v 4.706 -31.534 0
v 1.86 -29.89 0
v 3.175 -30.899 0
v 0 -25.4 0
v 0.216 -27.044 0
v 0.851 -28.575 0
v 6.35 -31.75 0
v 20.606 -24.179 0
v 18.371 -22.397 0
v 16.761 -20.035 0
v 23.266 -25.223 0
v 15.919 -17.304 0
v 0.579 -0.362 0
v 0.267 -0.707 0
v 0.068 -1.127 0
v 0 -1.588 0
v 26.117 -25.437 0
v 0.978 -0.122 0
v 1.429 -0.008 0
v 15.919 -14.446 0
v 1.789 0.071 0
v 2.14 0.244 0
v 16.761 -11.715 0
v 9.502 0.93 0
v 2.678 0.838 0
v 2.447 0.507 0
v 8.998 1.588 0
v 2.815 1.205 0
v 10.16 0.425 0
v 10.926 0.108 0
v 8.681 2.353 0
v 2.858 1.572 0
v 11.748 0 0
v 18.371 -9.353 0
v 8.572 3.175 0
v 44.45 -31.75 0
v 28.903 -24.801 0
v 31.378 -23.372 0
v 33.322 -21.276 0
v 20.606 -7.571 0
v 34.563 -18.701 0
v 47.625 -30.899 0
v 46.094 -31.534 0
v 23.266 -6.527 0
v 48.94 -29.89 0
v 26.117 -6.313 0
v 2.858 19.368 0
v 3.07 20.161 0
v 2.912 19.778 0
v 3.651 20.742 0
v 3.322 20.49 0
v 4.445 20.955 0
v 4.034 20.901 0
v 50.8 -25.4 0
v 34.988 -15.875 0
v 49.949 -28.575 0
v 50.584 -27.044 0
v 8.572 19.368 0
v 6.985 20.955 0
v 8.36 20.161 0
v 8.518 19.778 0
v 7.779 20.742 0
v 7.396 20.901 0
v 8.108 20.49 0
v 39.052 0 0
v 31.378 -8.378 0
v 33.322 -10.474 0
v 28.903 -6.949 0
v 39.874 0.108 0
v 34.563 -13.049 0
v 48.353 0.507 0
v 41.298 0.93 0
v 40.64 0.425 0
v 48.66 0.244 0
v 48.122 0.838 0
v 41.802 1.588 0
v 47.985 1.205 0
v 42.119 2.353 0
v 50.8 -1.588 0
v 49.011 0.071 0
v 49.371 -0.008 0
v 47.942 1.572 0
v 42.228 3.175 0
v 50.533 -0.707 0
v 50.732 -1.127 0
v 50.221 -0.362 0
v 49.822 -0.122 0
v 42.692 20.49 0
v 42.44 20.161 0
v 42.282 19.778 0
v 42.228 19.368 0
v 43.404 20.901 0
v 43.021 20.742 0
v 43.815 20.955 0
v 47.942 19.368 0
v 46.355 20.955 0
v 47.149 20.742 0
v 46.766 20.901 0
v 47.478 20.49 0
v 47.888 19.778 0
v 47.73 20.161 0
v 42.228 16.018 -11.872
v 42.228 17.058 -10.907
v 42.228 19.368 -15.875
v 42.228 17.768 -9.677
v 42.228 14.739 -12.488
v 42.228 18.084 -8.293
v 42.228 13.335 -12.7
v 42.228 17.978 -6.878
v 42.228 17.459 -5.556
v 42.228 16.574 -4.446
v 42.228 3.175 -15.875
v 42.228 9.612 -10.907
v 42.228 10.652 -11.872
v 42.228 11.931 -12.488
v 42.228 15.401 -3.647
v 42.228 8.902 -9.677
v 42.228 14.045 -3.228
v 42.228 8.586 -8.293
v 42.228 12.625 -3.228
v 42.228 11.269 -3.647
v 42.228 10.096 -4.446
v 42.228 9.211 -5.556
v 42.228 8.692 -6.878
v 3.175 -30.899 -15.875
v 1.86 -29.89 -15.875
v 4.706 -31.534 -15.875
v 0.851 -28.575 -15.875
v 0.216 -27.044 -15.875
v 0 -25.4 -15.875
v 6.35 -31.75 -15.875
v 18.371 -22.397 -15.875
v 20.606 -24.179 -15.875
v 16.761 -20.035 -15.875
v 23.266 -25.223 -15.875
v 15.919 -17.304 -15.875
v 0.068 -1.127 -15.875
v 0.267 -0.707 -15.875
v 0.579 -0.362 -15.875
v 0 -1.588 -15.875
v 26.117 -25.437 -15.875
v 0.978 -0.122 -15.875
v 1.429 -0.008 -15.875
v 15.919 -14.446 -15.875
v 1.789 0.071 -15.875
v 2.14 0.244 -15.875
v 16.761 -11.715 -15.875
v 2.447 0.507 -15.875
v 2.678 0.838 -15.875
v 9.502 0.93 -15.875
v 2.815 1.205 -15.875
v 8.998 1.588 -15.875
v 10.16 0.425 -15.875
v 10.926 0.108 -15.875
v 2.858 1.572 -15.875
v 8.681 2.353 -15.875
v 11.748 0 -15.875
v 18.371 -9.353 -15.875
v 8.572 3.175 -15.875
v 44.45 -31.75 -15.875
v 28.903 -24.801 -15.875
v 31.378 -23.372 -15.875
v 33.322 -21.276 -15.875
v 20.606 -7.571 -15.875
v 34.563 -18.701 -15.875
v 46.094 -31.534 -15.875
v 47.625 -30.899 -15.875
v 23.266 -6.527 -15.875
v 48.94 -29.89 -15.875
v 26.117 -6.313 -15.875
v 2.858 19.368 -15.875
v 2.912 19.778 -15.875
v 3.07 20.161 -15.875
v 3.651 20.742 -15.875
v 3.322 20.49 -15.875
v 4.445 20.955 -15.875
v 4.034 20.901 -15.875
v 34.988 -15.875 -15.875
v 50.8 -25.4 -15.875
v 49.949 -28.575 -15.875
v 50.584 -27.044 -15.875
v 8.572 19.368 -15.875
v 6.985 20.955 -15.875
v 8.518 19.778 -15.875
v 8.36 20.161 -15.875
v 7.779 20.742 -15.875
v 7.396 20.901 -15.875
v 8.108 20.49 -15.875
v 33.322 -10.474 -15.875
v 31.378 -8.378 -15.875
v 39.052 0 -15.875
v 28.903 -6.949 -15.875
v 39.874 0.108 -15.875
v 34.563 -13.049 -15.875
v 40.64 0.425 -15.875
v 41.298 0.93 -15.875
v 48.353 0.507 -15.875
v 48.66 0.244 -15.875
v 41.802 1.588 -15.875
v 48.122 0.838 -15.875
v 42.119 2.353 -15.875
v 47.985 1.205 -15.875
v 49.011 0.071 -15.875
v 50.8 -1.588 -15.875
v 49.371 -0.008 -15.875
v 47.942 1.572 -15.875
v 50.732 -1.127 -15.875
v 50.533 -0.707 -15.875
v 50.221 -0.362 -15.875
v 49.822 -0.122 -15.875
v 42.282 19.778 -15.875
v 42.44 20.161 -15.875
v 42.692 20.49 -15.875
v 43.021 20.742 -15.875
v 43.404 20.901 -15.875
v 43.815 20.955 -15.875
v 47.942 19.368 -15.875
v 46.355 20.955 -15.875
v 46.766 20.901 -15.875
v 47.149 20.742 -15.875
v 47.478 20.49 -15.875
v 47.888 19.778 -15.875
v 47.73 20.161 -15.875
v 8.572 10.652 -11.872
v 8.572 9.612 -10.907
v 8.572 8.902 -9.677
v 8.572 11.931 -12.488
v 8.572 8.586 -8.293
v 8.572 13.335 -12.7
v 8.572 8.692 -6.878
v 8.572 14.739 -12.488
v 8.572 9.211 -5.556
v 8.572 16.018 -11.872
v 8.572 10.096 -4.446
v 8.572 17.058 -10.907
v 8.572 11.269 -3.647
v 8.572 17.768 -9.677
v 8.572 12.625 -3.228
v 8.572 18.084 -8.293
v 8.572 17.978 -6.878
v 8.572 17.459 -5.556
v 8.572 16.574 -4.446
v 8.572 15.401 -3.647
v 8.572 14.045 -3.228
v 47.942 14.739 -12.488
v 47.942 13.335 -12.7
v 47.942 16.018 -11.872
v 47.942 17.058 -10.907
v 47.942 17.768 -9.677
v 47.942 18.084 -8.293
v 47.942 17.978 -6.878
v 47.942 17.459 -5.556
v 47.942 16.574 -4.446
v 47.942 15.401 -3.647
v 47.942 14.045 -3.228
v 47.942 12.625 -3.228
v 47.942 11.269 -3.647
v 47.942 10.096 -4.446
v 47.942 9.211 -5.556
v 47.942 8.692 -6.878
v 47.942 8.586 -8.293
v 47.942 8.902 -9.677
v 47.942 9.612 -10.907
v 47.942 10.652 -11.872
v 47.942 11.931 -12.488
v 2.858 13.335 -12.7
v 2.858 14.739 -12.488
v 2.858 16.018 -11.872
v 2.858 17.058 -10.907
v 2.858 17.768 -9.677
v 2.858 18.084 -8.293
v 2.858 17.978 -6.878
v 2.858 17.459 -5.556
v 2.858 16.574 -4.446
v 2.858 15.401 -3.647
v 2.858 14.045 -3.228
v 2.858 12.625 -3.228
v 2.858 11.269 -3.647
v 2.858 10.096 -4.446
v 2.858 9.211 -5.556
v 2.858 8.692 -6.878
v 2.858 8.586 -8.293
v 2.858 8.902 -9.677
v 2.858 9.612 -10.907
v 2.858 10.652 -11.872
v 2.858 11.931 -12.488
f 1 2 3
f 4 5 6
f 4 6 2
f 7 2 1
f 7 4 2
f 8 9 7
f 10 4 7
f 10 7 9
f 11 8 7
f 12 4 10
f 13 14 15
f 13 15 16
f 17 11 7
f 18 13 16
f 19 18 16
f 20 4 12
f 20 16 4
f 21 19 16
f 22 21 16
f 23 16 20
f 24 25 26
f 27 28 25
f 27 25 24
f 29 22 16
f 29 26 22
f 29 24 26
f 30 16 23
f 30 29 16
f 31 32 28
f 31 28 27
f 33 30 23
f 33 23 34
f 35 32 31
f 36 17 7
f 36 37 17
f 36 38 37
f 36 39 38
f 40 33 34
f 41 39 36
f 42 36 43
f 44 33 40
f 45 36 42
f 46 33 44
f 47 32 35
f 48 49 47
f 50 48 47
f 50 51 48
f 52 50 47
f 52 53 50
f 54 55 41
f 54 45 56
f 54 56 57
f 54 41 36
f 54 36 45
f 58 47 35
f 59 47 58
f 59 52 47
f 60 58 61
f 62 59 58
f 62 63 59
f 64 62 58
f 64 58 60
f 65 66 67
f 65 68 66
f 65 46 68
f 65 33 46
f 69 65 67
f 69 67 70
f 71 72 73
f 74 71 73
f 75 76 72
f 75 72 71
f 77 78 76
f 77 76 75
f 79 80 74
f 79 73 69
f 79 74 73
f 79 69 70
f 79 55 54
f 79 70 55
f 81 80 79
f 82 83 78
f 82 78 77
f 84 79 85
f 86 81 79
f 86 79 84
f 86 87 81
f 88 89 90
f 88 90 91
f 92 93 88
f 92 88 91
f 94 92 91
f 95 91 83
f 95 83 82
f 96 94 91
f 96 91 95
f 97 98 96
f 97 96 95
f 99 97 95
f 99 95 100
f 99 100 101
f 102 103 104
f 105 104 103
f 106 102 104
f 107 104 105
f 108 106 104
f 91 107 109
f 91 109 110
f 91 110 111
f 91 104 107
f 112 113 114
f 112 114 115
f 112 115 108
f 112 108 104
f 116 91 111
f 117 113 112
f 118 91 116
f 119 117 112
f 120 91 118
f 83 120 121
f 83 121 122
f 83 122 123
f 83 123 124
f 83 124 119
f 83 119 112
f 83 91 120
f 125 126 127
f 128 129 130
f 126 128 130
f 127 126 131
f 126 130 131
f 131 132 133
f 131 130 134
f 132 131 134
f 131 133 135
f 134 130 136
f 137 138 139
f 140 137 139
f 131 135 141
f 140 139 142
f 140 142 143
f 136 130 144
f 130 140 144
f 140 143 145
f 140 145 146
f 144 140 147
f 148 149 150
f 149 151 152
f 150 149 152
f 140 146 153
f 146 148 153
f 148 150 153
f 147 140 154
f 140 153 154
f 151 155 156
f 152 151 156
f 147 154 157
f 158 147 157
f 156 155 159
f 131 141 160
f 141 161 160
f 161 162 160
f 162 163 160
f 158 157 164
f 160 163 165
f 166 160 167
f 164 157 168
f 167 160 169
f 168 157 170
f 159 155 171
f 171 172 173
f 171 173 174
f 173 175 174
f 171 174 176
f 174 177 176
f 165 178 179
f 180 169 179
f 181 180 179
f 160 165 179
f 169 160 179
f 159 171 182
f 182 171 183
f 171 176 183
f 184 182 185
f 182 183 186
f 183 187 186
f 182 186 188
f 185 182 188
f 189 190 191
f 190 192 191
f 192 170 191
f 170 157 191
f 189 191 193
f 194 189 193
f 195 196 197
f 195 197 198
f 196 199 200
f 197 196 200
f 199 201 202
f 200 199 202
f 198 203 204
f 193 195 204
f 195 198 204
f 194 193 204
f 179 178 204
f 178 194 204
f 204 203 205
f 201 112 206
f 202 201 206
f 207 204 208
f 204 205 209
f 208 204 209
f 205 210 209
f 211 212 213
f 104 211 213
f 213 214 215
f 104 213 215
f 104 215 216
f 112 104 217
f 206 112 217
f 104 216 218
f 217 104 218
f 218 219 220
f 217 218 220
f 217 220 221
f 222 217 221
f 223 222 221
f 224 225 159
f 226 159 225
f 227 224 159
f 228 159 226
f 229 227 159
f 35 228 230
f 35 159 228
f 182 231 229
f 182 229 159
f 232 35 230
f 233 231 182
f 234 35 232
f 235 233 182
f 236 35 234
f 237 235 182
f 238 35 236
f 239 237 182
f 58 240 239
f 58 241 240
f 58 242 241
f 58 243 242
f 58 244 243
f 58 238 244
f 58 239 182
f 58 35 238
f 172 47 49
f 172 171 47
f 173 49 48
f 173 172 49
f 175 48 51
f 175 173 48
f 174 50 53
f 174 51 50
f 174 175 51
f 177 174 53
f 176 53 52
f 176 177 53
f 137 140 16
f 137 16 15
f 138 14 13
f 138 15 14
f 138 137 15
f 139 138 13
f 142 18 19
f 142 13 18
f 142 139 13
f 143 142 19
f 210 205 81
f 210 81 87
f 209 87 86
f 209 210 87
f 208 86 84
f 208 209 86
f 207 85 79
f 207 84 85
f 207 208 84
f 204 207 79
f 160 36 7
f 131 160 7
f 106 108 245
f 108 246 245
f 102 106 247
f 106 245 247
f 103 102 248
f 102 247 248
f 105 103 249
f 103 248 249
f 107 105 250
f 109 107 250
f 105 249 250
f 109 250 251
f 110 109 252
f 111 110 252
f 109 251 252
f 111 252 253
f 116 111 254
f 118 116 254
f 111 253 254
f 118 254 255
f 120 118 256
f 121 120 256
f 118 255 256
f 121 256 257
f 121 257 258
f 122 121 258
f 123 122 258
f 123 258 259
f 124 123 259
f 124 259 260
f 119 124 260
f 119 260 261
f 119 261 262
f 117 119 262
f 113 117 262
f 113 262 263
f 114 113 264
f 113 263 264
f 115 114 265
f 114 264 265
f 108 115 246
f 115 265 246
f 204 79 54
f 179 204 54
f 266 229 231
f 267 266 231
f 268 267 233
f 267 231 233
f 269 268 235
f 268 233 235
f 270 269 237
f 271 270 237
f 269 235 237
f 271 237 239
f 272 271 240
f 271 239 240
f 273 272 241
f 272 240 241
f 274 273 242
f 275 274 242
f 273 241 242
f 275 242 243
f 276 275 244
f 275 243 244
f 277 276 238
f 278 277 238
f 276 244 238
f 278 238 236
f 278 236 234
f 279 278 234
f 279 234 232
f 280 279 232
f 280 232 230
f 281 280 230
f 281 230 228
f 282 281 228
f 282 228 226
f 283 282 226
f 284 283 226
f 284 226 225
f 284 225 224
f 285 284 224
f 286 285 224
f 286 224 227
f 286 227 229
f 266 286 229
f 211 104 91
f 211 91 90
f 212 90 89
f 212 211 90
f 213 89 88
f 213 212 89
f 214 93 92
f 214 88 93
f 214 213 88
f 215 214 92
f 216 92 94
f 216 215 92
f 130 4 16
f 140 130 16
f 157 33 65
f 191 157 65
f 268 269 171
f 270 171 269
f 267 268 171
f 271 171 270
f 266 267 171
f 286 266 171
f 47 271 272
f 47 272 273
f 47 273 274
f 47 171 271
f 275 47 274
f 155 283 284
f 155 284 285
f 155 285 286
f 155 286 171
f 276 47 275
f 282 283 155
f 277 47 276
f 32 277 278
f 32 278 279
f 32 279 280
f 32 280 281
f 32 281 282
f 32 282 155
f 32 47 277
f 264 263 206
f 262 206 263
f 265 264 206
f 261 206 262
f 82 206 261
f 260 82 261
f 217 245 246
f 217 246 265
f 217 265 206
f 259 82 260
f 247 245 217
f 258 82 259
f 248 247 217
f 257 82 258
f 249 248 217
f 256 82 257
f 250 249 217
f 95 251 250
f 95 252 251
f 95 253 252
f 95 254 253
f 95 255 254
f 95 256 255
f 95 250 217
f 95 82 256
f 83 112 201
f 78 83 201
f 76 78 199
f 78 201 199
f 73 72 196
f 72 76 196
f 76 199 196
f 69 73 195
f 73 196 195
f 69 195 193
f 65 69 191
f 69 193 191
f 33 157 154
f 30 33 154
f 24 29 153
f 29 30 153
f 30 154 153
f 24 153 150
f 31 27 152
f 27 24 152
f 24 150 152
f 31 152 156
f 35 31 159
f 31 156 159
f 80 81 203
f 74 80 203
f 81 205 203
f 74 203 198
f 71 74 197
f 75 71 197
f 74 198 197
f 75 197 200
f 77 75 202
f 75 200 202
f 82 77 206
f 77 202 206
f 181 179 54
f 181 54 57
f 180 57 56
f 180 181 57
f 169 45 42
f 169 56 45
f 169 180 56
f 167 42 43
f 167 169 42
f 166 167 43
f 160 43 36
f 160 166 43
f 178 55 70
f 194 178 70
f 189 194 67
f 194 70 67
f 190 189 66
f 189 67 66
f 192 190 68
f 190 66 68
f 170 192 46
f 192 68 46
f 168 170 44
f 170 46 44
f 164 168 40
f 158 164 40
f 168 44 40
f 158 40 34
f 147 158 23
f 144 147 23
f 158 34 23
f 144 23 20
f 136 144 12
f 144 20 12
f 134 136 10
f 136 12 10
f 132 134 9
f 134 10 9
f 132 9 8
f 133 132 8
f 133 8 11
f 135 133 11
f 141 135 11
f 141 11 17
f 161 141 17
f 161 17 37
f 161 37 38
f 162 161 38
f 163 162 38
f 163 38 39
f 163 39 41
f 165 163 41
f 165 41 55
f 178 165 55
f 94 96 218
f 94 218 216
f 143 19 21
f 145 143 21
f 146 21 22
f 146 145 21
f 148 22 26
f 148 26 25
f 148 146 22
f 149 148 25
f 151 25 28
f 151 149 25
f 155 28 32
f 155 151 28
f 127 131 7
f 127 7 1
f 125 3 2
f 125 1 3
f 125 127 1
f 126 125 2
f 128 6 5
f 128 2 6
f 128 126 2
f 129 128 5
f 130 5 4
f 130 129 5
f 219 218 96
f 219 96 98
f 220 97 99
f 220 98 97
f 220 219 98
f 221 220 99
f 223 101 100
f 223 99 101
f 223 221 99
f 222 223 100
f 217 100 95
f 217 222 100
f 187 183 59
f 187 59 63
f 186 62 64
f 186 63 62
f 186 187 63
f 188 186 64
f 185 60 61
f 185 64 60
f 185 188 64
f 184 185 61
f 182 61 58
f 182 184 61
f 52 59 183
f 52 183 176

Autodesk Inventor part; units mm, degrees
ref_plane "YZ Plane" through (0, 0, 0) normal (1, 0, 0) x (0, 1, 0)
ref_plane "XZ Plane" through (0, 0, 0) normal (0, 1, 0) x (-1, 0, 0)
ref_plane "XY Plane" through (0, 0, 0) normal (0, 0, 1) x (1, 0, 0)
sketch "Sketch1" plane through (0, 0, 0) normal (0, 0, 1) x (1, 0, 0)
  line L0 (0, 0) -> (50.8, 0)
  line L1 (50.8, 0) -> (50.8, -31.75)
  line L2 (50.8, -31.75) -> (0, -31.75)
  line L3 (0, -31.75) -> (0, 0)
  line L4 (2.8575, 0) -> (8.5725, 0)
  line L5 (8.5725, 0) -> (8.5725, 20.955)
  line L6 (8.5725, 20.955) -> (2.8575, 20.955)
  line L7 (2.8575, 20.955) -> (2.8575, 0)
  line L8 (42.2275, 0) -> (47.9425, 0)
  line L9 (47.9425, 0) -> (47.9425, 20.955)
  line L10 (47.9425, 20.955) -> (42.2275, 20.955)
  line L11 (42.2275, 20.955) -> (42.2275, 0)
  dimension "d1" = 31.75
  dimension "d4" = 5.715
  dimension "d5" = 5.715
  dimension "d21" = 20.955
  dimension "d32" = 50.8
  dimension "d35" = 2.8575
  dimension "d37" = 2.8575
  dimension "d38" = 33.655
extrude "Extrusion1" add sketch "Sketch1" against normal blind 15.875
sketch "Sketch2" plane through (0, 0, 0) normal (0, 0, 1) x (1, 0, 0)
  circle A0 centre (25.4, -15.875) radius 9.5885
  line L0 (50.8, -31.75) -> (0, -31.75) projected
  line L1 (0, 0) -> (0, -31.75)
  dimension "d10" = 19.177
  dimension "d24" = 15.875
  dimension "d31" = 25.4
extrude "Extrusion2" cut sketch "Sketch2" against normal through all
sketch "Sketch3" plane through (47.9425, 0, 0) normal (1, 0, 0) x (0, 0, -1)
  line L0 (0, 20.955) -> (15.875, 20.955) projected
  circle A0 centre (7.9375, 13.335) radius 4.7625
  dimension "d13" = 9.525
  dimension "d15" = 7.62
extrude "Extrusion3" cut sketch "Sketch3" against normal up to next
fillet "Fillet2" radius 6.35 2 edges at (50.8, -31.75, -7.9375) (0, -31.75, -7.9375)
fillet "Fillet4" radius 1.5875 8 edges at (50.8, 0, -7.9375) (47.9425, 0, -7.9375) (47.9425, 20.955, -7.9375) (42.2275, 20.955, -7.9375) (8.5725, 20.955, -7.9375) (2.8575, 20.955, -7.9375) (0, 0, -7.9375) (2.8575, 0, -7.9375)
fillet "Fillet5" radius 3.175 2 edges at (8.5725, 0, -7.9375) (42.2275, 0, -7.9375)
sketch "Sketch4" plane through (8.5725, 19.3675, 0) normal (1, 0, 0) x (0, 0, -1)
  circle A0 centre (7.9375, -6.0325) radius 4.7625 projected
  circle A1 centre (7.9375, -6.0325) radius 4.7625
  point P0 (0, -19.3675)
  dimension "d26" = 9.525
extrude "Extrusion4" cut sketch "Sketch4" against normal through all
properties part number "Needle Bearing Mount v2"
